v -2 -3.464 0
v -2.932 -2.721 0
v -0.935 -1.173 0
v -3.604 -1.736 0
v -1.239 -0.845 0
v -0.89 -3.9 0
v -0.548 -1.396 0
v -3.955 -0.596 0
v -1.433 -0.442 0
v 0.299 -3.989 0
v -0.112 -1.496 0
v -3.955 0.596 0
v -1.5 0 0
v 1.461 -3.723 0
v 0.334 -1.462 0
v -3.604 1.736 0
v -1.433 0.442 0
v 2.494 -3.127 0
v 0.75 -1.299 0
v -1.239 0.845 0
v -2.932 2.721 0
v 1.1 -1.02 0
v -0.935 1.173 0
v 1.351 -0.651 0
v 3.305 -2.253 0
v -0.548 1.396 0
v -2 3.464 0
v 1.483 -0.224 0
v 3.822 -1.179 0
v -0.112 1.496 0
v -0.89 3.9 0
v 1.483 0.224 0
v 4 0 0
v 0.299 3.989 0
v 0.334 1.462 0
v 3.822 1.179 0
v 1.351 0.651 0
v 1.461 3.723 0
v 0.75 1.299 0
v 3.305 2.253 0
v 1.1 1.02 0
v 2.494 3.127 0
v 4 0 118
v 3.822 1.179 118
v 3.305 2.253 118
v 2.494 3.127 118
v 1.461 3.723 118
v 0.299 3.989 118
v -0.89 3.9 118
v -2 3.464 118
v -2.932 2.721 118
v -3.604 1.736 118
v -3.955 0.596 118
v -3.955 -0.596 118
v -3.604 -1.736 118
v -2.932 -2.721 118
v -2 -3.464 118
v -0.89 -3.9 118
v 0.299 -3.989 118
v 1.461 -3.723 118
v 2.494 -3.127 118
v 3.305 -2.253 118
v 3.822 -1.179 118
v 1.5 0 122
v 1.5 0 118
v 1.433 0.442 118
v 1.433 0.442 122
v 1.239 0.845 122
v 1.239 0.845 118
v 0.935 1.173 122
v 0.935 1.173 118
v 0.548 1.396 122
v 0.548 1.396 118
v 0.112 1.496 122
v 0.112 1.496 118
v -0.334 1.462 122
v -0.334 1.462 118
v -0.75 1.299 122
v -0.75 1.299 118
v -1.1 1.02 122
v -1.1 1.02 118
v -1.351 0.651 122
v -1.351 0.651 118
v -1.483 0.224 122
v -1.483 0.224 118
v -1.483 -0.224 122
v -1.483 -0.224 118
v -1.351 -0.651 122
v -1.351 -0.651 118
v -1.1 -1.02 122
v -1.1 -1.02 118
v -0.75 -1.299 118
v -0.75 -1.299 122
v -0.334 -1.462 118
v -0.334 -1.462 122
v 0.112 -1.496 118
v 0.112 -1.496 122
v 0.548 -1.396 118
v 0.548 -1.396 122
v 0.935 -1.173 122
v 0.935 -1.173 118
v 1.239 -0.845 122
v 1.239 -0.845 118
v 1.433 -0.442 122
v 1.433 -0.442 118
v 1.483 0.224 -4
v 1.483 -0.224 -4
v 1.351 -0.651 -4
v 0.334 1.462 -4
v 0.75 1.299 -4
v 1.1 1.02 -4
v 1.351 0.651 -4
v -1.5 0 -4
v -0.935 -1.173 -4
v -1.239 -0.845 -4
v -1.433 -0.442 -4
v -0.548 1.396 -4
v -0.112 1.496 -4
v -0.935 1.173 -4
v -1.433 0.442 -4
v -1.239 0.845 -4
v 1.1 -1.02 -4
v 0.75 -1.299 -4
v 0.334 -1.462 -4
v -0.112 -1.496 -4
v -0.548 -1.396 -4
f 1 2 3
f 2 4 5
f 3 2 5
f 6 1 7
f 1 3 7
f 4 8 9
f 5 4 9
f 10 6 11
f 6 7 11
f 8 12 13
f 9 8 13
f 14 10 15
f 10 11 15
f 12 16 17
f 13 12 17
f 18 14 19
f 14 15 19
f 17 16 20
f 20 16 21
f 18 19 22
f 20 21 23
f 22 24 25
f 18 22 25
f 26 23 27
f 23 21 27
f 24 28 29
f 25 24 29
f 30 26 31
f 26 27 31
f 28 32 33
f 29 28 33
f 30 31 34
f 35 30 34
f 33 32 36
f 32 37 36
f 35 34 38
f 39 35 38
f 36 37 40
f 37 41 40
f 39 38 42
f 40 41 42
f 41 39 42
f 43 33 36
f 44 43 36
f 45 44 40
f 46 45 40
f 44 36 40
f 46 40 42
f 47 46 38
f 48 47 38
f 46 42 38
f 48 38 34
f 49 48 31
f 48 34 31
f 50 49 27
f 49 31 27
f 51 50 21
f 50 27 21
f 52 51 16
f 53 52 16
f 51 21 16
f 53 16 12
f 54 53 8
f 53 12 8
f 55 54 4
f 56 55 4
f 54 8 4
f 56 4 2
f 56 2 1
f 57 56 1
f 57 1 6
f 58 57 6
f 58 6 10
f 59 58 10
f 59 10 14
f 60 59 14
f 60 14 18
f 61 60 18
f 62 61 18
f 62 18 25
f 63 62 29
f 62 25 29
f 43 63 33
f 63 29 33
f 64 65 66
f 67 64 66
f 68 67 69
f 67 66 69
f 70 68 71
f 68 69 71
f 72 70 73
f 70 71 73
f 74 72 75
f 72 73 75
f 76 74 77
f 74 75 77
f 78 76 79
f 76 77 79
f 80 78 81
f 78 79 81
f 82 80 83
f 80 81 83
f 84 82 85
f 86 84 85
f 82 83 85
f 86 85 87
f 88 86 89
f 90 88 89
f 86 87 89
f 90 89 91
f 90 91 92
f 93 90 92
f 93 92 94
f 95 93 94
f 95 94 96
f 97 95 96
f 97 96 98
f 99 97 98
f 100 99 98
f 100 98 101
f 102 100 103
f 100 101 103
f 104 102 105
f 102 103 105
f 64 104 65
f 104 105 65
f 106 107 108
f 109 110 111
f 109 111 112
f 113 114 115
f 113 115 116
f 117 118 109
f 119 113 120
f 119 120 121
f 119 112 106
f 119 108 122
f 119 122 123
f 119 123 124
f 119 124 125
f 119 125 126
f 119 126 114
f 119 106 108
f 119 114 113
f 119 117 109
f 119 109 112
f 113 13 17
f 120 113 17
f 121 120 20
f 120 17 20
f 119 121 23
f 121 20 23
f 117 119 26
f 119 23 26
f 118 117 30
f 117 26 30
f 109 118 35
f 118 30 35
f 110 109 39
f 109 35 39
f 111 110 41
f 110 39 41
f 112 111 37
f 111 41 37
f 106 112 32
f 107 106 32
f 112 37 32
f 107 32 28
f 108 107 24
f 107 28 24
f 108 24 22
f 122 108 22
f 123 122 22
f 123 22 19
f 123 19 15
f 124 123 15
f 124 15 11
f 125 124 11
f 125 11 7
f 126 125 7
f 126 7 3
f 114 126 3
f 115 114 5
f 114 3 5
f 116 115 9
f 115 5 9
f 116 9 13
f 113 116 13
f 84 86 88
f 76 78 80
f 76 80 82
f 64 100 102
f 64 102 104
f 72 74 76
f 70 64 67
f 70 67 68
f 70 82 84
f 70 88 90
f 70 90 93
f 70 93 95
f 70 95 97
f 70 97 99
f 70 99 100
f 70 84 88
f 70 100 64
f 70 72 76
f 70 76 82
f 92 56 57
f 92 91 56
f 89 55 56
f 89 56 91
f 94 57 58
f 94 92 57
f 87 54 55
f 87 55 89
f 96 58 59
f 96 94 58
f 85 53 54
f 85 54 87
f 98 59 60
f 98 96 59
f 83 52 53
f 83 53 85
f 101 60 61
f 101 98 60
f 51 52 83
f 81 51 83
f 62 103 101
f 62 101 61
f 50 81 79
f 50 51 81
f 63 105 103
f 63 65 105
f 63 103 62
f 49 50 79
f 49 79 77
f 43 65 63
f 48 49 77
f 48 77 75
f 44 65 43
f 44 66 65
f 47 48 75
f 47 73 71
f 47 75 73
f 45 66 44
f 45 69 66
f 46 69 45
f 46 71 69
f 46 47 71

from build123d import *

# Parameters (mm, degrees)
SKETCH_1_R      = 4
EXTRUDE_1_DEPTH = 118
SKETCH_2_R      = 1.5
EXTRUDE_2_DEPTH = 4
SKETCH_3_R      = 1.5
EXTRUDE_3_DEPTH = 4


with BuildPart() as part:
    # 草图1 → 凸台-拉伸1 (new body)
    with BuildSketch(Plane.XY):
        Circle(SKETCH_1_R)
    extrude(amount=EXTRUDE_1_DEPTH)

    # 草图2 → 凸台-拉伸2 (add)
    with BuildSketch(Plane(origin=(0, 0, 0), x_dir=(-1, 0, 0), z_dir=(0, 0, -1))):
        Circle(SKETCH_2_R)
    extrude(amount=EXTRUDE_2_DEPTH)

    # 草图3 → 凸台-拉伸3 (add)
    with BuildSketch(Plane.XY.offset(118)):
        Circle(SKETCH_3_R)
    extrude(amount=EXTRUDE_3_DEPTH)


solid = part.part
